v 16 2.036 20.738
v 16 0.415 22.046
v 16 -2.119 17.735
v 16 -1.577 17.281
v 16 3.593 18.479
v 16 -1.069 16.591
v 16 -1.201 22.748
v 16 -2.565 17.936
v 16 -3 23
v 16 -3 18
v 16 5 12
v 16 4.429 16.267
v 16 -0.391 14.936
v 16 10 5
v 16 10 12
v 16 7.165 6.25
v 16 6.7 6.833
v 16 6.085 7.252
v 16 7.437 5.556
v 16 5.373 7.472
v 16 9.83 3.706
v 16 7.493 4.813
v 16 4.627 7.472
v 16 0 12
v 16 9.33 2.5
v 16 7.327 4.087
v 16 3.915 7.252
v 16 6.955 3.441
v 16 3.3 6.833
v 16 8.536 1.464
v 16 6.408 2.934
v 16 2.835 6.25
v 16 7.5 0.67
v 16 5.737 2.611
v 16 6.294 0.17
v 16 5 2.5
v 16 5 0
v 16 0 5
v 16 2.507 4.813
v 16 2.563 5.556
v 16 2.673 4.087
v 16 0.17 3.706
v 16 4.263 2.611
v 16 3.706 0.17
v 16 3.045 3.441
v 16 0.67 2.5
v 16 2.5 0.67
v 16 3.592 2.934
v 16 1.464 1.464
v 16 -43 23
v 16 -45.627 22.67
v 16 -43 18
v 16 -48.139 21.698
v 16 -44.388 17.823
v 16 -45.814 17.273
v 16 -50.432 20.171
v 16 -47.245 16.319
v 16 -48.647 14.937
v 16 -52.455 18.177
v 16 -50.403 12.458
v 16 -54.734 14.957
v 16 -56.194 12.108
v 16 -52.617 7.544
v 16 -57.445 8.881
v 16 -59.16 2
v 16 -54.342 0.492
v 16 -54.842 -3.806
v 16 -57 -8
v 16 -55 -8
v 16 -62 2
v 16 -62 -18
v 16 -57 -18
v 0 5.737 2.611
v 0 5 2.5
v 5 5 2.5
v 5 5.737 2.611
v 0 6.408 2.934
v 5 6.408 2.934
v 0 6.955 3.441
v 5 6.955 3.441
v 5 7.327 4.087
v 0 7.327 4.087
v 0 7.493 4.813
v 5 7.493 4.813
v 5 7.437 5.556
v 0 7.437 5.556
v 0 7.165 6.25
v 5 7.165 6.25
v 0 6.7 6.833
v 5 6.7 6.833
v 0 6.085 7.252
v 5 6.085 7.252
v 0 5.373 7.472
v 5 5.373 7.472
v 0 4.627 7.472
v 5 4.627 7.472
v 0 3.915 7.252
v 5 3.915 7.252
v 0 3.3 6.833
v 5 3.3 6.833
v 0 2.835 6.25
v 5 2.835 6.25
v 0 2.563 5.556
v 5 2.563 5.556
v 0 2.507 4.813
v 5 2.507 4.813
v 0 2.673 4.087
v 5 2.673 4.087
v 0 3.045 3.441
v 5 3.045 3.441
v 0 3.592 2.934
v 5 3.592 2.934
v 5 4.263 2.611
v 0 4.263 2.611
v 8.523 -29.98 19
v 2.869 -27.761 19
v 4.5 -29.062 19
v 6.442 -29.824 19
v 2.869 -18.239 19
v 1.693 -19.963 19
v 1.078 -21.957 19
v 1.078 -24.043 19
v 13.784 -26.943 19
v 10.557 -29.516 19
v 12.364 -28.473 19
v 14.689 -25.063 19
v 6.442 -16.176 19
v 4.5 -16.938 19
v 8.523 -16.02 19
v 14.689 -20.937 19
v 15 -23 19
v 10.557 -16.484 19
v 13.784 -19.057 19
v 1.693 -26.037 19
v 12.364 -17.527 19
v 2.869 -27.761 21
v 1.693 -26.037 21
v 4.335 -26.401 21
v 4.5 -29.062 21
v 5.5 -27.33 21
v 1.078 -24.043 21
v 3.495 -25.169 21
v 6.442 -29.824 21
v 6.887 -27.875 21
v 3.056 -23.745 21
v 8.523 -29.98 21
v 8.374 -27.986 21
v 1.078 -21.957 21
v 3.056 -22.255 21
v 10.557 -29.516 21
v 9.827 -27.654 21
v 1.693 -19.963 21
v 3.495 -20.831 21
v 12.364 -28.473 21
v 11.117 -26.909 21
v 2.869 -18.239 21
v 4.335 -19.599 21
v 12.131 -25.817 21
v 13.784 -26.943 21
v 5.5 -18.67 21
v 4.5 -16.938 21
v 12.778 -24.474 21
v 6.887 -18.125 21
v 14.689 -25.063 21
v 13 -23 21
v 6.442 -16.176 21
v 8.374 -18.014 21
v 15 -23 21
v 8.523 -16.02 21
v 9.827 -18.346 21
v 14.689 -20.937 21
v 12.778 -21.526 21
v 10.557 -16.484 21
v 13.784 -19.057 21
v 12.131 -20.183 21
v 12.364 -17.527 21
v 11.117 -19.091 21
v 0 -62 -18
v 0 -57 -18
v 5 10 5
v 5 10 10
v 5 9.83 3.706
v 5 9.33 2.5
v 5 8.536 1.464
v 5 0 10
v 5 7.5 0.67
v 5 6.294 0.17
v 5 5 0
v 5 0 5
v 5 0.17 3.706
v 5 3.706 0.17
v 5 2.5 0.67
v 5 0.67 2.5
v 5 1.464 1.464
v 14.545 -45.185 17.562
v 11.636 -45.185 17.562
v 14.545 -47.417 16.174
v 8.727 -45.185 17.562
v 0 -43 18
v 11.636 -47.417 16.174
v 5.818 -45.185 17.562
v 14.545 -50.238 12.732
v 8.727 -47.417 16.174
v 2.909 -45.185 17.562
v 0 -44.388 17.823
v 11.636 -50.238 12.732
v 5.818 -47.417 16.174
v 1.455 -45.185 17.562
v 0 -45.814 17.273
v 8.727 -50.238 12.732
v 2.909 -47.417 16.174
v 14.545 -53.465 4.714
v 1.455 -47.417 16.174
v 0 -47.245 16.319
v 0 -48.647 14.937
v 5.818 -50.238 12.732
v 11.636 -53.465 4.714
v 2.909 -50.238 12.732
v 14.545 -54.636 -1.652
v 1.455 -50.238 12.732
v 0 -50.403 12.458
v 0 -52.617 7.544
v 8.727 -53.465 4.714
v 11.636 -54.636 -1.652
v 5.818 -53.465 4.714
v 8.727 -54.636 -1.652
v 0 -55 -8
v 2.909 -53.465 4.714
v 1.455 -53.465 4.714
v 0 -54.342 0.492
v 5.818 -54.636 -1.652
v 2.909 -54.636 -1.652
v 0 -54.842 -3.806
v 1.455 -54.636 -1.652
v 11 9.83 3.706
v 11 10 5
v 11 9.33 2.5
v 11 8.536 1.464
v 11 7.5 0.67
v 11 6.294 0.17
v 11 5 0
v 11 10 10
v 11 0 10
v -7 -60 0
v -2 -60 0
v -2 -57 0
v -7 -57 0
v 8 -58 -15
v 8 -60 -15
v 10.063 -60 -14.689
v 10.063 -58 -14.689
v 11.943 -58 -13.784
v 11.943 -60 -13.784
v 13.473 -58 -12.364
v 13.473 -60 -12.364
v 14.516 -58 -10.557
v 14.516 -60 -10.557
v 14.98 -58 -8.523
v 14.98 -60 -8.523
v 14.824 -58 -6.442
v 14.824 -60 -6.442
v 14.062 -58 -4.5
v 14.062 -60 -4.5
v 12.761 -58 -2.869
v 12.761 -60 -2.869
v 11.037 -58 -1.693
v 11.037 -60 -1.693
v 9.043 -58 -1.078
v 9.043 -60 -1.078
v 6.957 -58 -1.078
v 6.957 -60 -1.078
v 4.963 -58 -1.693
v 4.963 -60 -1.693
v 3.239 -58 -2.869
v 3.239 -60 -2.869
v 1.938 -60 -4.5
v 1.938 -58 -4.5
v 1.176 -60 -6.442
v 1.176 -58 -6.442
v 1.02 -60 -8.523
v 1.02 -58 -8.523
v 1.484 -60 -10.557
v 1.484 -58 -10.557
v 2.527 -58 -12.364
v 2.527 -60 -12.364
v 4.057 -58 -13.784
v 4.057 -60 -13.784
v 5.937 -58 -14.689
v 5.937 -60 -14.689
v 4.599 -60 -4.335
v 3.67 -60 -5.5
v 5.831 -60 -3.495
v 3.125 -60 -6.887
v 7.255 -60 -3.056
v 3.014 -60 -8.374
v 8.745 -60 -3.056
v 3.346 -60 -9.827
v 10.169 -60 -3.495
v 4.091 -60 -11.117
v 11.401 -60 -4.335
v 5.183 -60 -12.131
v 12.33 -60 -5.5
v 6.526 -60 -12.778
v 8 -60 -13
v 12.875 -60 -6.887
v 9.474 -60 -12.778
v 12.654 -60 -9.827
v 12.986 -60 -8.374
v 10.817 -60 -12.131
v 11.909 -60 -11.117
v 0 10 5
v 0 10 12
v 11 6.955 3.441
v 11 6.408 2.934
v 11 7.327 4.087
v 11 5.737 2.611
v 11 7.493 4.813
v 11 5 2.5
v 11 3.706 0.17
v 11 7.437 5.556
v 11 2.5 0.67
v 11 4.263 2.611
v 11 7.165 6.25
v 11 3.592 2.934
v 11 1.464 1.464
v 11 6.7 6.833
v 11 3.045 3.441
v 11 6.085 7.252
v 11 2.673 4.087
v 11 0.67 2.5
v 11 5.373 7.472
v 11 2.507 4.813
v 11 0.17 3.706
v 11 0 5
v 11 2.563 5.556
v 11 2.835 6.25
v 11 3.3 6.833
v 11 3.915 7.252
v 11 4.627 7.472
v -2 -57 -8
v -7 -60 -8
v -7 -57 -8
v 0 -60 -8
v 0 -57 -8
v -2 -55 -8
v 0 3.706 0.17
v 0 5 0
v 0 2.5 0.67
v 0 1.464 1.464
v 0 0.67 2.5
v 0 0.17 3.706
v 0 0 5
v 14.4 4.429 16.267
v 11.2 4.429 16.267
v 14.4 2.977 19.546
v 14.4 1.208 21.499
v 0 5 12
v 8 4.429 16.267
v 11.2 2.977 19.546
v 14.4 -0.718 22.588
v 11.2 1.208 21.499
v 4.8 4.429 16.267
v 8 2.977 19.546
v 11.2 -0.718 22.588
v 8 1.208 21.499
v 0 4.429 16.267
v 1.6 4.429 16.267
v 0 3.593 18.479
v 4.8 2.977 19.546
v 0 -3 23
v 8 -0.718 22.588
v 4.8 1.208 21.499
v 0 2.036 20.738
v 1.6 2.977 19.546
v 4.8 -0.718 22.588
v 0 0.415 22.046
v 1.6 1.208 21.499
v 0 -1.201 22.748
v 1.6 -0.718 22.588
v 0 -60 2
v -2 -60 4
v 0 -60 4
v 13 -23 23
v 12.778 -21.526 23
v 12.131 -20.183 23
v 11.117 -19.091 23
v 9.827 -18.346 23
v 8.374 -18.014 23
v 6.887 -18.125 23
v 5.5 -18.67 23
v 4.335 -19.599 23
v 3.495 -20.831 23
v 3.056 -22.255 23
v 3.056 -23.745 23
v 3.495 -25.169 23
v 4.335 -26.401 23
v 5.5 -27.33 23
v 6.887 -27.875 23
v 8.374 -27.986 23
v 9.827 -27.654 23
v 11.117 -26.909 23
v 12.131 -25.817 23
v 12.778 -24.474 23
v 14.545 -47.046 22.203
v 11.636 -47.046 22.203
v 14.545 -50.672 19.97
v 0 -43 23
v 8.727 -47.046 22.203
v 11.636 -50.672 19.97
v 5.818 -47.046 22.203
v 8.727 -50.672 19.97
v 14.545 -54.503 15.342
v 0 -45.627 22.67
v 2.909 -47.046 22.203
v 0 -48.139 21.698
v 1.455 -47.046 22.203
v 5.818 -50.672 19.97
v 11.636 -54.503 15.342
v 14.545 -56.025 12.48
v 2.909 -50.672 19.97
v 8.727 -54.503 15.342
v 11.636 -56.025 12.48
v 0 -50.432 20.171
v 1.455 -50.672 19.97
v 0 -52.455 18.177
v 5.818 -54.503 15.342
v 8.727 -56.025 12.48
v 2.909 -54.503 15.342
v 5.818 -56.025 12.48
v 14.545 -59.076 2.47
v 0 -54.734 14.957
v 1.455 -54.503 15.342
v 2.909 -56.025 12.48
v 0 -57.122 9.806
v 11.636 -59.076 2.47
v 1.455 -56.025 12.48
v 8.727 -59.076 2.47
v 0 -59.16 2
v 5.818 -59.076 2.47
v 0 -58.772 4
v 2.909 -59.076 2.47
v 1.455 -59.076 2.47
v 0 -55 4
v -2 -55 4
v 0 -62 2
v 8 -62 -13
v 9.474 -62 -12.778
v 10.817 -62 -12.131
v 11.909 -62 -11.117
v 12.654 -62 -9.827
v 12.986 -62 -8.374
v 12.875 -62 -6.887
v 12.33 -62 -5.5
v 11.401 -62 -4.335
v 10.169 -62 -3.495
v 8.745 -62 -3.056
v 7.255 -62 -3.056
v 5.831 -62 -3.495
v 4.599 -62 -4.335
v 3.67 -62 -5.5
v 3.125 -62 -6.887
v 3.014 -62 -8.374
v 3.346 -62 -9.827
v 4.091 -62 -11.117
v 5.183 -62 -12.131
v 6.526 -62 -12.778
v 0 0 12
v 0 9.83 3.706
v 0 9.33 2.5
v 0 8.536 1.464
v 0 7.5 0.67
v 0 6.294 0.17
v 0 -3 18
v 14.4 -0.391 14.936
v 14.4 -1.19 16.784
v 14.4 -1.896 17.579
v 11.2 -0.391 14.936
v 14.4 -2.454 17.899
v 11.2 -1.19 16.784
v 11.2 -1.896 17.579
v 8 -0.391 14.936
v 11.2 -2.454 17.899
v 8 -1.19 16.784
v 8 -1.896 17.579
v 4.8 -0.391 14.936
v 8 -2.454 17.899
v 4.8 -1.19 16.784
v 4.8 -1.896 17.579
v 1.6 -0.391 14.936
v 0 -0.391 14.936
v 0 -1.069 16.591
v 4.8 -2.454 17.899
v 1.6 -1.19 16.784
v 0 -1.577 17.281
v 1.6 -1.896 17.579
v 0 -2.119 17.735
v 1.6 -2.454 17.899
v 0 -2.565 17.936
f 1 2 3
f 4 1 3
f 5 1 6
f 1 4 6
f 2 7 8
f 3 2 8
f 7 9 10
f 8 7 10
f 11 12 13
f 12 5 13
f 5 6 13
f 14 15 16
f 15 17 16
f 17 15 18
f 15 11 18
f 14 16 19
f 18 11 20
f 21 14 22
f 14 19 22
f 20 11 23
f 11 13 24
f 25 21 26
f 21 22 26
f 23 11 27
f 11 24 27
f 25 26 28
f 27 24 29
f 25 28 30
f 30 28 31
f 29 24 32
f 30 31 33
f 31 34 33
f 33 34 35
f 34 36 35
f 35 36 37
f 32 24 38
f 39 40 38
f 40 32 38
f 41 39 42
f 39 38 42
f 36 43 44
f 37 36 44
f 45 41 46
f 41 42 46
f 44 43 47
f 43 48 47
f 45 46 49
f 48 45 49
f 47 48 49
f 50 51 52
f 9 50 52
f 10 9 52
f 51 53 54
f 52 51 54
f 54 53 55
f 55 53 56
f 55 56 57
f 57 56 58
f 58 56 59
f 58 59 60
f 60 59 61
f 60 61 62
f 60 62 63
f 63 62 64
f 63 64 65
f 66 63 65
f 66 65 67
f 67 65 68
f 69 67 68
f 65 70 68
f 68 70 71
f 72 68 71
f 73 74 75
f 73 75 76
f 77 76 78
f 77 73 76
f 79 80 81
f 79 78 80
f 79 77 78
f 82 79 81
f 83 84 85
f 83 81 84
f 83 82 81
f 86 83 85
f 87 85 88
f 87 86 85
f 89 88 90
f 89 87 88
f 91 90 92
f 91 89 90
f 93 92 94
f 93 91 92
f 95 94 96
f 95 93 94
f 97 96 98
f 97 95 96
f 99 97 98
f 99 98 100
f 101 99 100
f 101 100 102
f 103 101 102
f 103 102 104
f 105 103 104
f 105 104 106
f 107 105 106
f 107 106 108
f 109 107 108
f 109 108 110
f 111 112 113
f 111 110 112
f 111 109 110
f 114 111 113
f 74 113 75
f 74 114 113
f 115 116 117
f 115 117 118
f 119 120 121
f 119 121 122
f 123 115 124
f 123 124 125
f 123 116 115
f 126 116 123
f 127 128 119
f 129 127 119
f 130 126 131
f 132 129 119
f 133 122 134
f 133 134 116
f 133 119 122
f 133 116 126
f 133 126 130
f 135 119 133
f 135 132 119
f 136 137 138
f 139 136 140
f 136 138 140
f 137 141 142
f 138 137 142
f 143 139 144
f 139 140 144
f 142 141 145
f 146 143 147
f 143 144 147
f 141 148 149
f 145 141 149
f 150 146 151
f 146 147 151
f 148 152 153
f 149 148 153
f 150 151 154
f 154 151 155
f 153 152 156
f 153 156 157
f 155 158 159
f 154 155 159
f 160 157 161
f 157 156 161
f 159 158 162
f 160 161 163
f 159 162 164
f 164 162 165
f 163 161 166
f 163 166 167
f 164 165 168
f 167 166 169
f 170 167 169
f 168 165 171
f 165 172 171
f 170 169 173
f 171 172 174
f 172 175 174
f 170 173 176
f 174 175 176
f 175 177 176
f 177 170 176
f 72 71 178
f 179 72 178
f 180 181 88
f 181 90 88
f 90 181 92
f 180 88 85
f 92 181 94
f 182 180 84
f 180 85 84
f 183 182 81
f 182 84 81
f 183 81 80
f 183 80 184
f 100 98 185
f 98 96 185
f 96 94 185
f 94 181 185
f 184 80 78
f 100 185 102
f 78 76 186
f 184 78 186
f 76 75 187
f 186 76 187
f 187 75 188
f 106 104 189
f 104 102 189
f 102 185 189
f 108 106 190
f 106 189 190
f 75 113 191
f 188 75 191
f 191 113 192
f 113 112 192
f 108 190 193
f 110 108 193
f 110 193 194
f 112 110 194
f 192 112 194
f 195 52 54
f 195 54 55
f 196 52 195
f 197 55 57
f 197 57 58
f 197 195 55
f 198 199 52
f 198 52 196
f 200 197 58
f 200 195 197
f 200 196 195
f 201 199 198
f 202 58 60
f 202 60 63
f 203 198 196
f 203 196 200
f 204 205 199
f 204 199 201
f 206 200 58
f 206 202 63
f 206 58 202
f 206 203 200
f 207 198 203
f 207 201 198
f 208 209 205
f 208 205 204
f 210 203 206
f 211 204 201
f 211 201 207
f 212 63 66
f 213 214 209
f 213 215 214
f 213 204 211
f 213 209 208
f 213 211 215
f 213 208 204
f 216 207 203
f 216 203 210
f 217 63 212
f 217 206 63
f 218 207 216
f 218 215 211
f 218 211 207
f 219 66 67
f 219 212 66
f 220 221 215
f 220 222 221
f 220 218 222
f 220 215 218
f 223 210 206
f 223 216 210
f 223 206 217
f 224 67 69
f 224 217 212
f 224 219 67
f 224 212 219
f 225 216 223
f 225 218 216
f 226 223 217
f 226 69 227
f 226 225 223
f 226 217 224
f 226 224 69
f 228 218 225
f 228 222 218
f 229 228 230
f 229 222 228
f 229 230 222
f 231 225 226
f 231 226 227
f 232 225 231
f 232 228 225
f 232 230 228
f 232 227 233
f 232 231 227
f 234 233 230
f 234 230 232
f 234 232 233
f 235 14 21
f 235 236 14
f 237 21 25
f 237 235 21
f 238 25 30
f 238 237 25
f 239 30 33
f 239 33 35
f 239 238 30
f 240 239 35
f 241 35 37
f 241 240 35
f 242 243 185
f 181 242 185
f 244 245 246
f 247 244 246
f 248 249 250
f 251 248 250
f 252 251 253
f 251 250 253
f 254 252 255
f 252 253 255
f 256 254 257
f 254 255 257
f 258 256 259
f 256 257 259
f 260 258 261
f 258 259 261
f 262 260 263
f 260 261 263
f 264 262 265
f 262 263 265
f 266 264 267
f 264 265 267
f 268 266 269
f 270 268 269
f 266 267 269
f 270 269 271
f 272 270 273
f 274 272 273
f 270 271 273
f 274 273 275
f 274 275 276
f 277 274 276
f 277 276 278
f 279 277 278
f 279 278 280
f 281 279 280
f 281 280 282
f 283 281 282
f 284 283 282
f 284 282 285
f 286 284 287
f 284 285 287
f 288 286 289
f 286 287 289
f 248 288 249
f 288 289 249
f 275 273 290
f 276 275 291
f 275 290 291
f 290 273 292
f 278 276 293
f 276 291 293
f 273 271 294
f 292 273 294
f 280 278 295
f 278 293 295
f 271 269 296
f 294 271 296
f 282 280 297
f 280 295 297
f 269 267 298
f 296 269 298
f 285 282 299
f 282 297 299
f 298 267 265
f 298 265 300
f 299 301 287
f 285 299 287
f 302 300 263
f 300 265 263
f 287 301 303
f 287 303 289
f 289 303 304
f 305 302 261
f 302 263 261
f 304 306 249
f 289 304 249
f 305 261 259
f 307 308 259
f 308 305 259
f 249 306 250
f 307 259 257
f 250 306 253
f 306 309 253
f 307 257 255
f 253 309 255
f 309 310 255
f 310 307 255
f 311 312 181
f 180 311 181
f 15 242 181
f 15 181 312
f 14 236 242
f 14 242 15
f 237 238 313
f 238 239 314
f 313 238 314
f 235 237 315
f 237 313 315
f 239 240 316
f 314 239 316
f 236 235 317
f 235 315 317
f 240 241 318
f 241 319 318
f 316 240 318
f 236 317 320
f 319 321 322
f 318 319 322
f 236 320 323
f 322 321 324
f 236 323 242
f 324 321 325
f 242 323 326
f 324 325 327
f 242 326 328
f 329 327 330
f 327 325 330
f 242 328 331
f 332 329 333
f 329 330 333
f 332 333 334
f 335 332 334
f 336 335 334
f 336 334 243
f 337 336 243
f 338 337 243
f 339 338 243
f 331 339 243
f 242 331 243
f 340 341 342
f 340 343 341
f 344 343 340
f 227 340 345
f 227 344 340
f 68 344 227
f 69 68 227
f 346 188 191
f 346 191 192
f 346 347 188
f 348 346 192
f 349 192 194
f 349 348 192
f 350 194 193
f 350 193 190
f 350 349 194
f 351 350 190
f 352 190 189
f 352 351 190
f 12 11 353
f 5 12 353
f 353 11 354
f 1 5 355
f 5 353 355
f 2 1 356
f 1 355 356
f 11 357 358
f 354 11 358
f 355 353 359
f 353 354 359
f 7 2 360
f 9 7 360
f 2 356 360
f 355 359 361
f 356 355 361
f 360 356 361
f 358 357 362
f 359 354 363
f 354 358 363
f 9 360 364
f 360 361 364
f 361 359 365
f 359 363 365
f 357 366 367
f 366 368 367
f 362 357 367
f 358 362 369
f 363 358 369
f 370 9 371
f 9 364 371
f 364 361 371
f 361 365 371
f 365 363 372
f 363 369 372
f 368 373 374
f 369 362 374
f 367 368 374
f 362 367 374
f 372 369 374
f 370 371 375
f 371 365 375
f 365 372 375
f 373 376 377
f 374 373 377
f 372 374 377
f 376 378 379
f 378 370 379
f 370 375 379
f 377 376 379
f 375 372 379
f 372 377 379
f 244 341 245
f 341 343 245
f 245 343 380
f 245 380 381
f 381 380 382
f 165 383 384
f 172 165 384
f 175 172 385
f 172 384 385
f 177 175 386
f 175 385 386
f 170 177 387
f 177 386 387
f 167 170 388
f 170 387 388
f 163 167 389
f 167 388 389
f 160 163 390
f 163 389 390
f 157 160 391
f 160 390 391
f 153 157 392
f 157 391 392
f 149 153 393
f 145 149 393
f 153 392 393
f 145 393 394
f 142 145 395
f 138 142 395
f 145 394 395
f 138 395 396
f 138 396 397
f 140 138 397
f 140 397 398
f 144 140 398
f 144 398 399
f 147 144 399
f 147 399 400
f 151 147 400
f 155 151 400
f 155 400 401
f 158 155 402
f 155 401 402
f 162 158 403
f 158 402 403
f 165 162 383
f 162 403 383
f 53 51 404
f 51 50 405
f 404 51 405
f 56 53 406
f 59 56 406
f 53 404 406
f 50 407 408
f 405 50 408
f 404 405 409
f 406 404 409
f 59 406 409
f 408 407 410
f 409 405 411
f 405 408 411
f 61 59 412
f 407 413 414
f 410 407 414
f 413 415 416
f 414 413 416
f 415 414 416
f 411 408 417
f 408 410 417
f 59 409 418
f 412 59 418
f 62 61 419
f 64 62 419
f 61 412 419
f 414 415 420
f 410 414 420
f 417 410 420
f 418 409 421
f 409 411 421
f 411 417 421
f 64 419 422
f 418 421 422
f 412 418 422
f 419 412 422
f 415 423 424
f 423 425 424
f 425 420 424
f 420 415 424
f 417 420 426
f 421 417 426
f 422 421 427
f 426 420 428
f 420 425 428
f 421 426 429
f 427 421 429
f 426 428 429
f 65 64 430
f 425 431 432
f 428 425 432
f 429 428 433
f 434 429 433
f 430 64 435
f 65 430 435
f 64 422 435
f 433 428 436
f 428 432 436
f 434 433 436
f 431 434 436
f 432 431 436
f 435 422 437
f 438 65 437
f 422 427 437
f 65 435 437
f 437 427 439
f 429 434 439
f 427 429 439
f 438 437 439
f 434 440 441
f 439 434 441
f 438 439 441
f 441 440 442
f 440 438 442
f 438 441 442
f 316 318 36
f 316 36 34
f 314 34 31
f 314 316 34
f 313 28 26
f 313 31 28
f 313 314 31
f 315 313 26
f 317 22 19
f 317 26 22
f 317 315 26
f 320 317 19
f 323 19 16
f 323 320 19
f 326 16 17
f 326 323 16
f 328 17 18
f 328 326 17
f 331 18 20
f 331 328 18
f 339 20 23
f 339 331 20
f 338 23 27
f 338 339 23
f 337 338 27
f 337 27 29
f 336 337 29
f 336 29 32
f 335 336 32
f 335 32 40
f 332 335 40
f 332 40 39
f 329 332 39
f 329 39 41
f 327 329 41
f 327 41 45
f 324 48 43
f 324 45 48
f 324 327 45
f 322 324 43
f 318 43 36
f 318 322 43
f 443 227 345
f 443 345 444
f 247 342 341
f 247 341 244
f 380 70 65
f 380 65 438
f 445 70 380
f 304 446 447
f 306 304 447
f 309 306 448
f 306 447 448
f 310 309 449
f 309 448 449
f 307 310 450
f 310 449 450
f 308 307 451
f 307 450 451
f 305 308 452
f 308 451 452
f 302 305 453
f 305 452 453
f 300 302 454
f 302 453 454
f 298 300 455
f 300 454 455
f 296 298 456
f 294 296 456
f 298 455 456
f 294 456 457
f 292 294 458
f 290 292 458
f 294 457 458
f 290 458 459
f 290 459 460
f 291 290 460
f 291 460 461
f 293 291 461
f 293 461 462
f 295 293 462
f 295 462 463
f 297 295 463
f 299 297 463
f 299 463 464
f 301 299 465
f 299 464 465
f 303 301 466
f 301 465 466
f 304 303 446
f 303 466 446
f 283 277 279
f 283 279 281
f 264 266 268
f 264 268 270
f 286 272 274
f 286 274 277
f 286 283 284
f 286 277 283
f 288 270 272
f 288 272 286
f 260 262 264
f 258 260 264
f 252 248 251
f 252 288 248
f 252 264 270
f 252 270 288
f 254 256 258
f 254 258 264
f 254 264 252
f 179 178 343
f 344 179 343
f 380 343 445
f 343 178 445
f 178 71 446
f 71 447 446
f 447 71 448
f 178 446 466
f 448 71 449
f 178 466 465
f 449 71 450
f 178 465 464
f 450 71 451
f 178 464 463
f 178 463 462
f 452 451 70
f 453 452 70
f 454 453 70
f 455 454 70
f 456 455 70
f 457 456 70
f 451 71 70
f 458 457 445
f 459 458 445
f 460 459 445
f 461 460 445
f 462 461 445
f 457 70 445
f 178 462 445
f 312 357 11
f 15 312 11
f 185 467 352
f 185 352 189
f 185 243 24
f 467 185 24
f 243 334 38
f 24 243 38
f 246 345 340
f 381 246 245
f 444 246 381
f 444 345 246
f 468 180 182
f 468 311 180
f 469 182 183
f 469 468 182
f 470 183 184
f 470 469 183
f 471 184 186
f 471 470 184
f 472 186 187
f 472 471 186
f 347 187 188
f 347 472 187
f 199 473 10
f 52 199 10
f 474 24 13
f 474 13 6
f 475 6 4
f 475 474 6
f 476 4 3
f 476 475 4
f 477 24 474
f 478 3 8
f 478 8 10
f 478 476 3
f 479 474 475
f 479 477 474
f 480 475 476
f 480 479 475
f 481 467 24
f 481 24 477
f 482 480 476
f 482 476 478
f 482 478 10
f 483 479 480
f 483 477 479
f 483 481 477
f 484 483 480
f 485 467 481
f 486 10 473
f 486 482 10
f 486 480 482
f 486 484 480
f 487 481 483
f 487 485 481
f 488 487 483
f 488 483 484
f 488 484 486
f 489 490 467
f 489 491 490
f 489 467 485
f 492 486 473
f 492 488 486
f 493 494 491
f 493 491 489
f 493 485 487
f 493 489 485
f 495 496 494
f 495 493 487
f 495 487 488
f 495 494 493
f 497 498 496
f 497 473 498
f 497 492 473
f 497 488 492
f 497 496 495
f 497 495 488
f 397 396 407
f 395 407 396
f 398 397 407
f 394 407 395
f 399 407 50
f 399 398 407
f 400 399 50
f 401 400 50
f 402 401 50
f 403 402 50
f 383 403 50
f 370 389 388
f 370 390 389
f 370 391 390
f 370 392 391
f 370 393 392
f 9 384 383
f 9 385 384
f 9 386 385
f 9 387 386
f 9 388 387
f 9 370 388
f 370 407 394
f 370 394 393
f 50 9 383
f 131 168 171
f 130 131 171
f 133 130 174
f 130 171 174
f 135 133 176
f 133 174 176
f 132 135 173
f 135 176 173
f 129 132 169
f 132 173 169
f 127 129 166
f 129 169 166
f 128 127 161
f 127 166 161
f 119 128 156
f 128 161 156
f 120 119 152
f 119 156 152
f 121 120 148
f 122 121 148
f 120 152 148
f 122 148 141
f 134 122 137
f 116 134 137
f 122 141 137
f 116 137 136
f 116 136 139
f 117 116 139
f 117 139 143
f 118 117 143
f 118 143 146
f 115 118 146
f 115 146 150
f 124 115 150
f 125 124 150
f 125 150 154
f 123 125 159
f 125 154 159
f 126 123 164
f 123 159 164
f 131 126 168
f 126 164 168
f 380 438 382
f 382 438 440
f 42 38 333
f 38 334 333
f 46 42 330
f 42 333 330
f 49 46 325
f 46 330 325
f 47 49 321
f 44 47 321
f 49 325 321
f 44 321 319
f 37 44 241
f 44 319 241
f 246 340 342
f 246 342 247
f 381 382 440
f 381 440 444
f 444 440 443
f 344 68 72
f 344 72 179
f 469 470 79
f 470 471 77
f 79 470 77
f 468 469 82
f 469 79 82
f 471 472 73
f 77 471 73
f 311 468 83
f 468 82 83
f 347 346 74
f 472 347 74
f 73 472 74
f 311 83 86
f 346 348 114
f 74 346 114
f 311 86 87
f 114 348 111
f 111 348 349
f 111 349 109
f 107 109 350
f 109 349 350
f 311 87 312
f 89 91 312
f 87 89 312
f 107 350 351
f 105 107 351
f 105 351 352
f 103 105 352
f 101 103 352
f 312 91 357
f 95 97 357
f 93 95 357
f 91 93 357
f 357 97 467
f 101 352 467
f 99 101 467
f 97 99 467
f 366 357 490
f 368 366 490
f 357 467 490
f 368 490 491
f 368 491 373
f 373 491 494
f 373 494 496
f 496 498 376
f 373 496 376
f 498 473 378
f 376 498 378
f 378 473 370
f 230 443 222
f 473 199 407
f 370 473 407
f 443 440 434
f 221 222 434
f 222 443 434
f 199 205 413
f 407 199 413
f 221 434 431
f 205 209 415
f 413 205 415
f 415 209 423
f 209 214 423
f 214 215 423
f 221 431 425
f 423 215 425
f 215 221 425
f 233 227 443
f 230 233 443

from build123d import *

# Parameters (mm, degrees)
BOSS_EXTRUDE2_DEPTH     = 10
CUT_EXTRUDE1_DEPTH      = 20.104973175
CUT_EXTRUDE1_DEPTH_BACK = 20.104973175
SKETCH3_R               = 2.5
SWEEP2_DEPTH            = 16
SKETCH6_W               = 16
SKETCH6_H               = 5
BOSS_EXTRUDE3_DEPTH     = 40
SWEEP4_DEPTH            = 16
SKETCH11_R              = 5
CUT_EXTRUDE2_DEPTH      = 2
SKETCH13_R              = 7
CUT_EXTRUDE3_DEPTH      = 2
BOSS_EXTRUDE6_START     = -2
BOSS_EXTRUDE6_DEPTH     = 5
SKETCH14_R              = 5
CUT_EXTRUDE4_DEPTH      = 2
SKETCH15_R              = 7
CUT_EXTRUDE5_DEPTH      = 2
SKETCH17_W              = 12
SKETCH17_H              = 5
BOSS_EXTRUDE8_DEPTH     = 2
SKETCH18_W              = 8
SKETCH18_H              = 3
BOSS_EXTRUDE9_DEPTH     = 5
FILLET1_R               = 5


# Read off the part's stored shape, not the designer's step: Sweep2, Sweep4
with BuildPart() as part:
    # Sketch1 → Boss-Extrude2 (new body)
    with BuildSketch(Plane(origin=(0, 0, 0), x_dir=(1, 0, 0), z_dir=(0, 1, 0))):
        Polygon((16, 0), (11, 0), (11, -10), (5, -10), (5, 0), (0, 0), (0, -12), (16, -12), align=None)
    extrude(amount=BOSS_EXTRUDE2_DEPTH)

    # Sketch3 → Cut-Extrude1 (cut, two sides: drawn at the far end of the back side and taken through both)
    with BuildSketch(Plane(origin=(5, 0, 0), x_dir=(0, 0, -1), z_dir=(1, 0, 0)).offset(-CUT_EXTRUDE1_DEPTH_BACK)):
        with Locations((-5, 5)):
            Circle(SKETCH3_R)
    extrude(amount=CUT_EXTRUDE1_DEPTH + CUT_EXTRUDE1_DEPTH_BACK, mode=Mode.SUBTRACT)

    # Sweep2 outline → Sweep2 (add)
    with BuildSketch(Plane.YZ):
        with BuildLine():
            Line((0, 12), (5, 12))
            add(Edge.make_bspline(
                [(5, 12), (4.991277814, 12.688318981), (4.908746061, 14.118877097), (4.494059835, 16.245318685), (3.957732254, 17.750342889), (3.411318321, 18.842891552), (3.001489478, 19.557726126), (2.242511991, 20.561874881), (1.580556332, 21.203692416), (0.928716087, 21.720024552), (0.323591986, 22.133748121), (-0.701392406, 22.614526195), (-1.823238843, 22.935468381), (-2.608908218, 22.983859145), (-3, 23)],
                knots=[0, 0, 0, 0, 0.166666667, 0.333333333, 0.5, 0.5, 0.583333333, 0.666666667, 0.75, 0.75, 0.8125, 0.875, 0.9375, 1, 1, 1, 1], degree=3))
            Line((-3, 23), (-3, 18))
            add(Edge.make_bspline(
                [(0, 12), (0, 12.471404521), (-0.065087382, 13.468133715), (-0.357980601, 14.963227506), (-0.683417511, 15.852116395), (-0.976310729, 16.437902833), (-1.185341525, 16.80000901), (-1.529633622, 17.249552677), (-1.772618921, 17.481263886), (-1.988038584, 17.651829247), (-2.174202639, 17.777587461), (-2.454251279, 17.908151493), (-2.731349145, 17.983890946), (-2.911611652, 18), (-3, 18)],
                knots=[0, 0, 0, 0, 0.166666667, 0.333333333, 0.5, 0.5, 0.583333333, 0.666666667, 0.75, 0.75, 0.8125, 0.875, 0.9375, 1, 1, 1, 1], degree=3))
        make_face()
    extrude(amount=SWEEP2_DEPTH)

    # Sketch6 → Boss-Extrude3 (add)
    with BuildSketch(Plane.XZ.offset(3)):
        with Locations((8, 20.5)):
            Rectangle(SKETCH6_W, SKETCH6_H)
    extrude(amount=BOSS_EXTRUDE3_DEPTH)

    # Sweep4 outline → Sweep4 (add)
    with BuildSketch(Plane.YZ):
        with BuildLine():
            add(Edge.make_bspline(
                [(-43, 18), (-43.353553391, 18), (-44.07460342, 17.930194099), (-45.182994884, 17.601989805), (-46.303189443, 17.036212331), (-47.047845664, 16.491260068), (-47.909524316, 15.752143507), (-48.881465514, 14.748061599), (-50.258633898, 12.800039043), (-51.094757082, 11.230912276), (-52.266329958, 8.69250438), (-53.267394144, 5.796111577), (-53.962527772, 2.637302685), (-54.352391453, 0.503622212), (-54.828170089, -2.731995713), (-55, -5.957247077), (-55, -8)],
                knots=[0, 0, 0, 0, 0.0625, 0.125, 0.1875, 0.25, 0.25, 0.333333333, 0.416666667, 0.5, 0.5, 0.666666667, 0.75, 0.75, 0.833333333, 1, 1, 1, 1], degree=3))
            Line((-43, 18), (-43, 23))
            add(Edge.make_bspline(
                [(-43, 23), (-43.681450726, 22.980975055), (-45.058295426, 22.873119263), (-47.066050979, 22.260765234), (-48.956424122, 21.301498195), (-50.119260314, 20.44421056), (-51.410038967, 19.336819996), (-52.782815769, 17.905936964), (-54.54234243, 15.403608104), (-55.559709648, 13.48696901), (-56.955815594, 10.466263575), (-58.086746894, 7.16551514), (-58.86004663, 3.650567343), (-59.291844345, 1.290053693), (-59.815258978, -2.269924856), (-59.994835555, -5.772418734), (-60, -8)],
                knots=[0, 0, 0, 0, 0.0625, 0.125, 0.1875, 0.25, 0.25, 0.333333333, 0.416666667, 0.5, 0.5, 0.666666667, 0.75, 0.75, 0.833333333, 1, 1, 1, 1], degree=3))
            Line((-60, -8), (-55, -8))
        make_face()
    extrude(amount=SWEEP4_DEPTH)

    # Sketch11 → Cut-Extrude2 (cut)
    with BuildSketch(Plane.XY.offset(23)):
        with Locations((8, -23)):
            Circle(SKETCH11_R)
    extrude(amount=-CUT_EXTRUDE2_DEPTH, mode=Mode.SUBTRACT)

    # Sketch13 → Cut-Extrude3 (cut)
    with BuildSketch(Plane.XY.offset(21)):
        with Locations((8, -23)):
            Circle(SKETCH13_R)
    extrude(amount=-CUT_EXTRUDE3_DEPTH, mode=Mode.SUBTRACT)

    # 3DSketch1 → Boss-Extrude6 (add)
    with BuildSketch(Plane(origin=(0, -60, -8), x_dir=(0.8479983040050881, 0, 0.52999894000318), z_dir=(0, 1, 0)).offset(BOSS_EXTRUDE6_START)):
        Polygon((0, 0), (13.567972864, 8.47998304), (18.867962264, 0), (5.2999894, -8.47998304), align=None)
    boss_extrude6 = extrude(amount=BOSS_EXTRUDE6_DEPTH)

    # Mirror1: Boss-Extrude6 across plane
    add(boss_extrude6.mirror(Plane(origin=(0, -37, -8), x_dir=(1, 0, 0), z_dir=(0, 0, 1))))

    # Sketch14 → Cut-Extrude4 (cut)
    with BuildSketch(Plane.XZ.offset(62)):
        with Locations(Location((8, -8, 0), (0, 0, 270))):
            Circle(SKETCH14_R)
    extrude(amount=-CUT_EXTRUDE4_DEPTH, mode=Mode.SUBTRACT)

    # Sketch15 → Cut-Extrude5 (cut)
    with BuildSketch(Plane.XZ.offset(60)):
        with Locations(Location((8, -8, 0), (0, 0, 270))):
            Circle(SKETCH15_R)
    extrude(amount=-CUT_EXTRUDE5_DEPTH, mode=Mode.SUBTRACT)

    # Sketch17 → Boss-Extrude8 (add)
    with BuildSketch(Plane.ZY):
        with Locations((-2, -57.5)):
            Rectangle(SKETCH17_W, SKETCH17_H)
    extrude(amount=BOSS_EXTRUDE8_DEPTH)

    # Sketch18 → Boss-Extrude9 (add)
    with BuildSketch(Plane.ZY.offset(2)):
        with Locations((-4, -58.5)):
            Rectangle(SKETCH18_W, SKETCH18_H)
    extrude(amount=BOSS_EXTRUDE9_DEPTH)

    # Fillet1
    fillet1_edges = [part.edges().sort_by_distance(p)[0] for p in [
        (13.5, 10, 0),
        (13.5, 0, 0),
        (2.5, 0, 0),
        (2.5, 10, 0),
    ]]
    fillet(fillet1_edges, radius=FILLET1_R - 0.0001)  # a hair under: the kernel refuses the full size


solid = part.part
